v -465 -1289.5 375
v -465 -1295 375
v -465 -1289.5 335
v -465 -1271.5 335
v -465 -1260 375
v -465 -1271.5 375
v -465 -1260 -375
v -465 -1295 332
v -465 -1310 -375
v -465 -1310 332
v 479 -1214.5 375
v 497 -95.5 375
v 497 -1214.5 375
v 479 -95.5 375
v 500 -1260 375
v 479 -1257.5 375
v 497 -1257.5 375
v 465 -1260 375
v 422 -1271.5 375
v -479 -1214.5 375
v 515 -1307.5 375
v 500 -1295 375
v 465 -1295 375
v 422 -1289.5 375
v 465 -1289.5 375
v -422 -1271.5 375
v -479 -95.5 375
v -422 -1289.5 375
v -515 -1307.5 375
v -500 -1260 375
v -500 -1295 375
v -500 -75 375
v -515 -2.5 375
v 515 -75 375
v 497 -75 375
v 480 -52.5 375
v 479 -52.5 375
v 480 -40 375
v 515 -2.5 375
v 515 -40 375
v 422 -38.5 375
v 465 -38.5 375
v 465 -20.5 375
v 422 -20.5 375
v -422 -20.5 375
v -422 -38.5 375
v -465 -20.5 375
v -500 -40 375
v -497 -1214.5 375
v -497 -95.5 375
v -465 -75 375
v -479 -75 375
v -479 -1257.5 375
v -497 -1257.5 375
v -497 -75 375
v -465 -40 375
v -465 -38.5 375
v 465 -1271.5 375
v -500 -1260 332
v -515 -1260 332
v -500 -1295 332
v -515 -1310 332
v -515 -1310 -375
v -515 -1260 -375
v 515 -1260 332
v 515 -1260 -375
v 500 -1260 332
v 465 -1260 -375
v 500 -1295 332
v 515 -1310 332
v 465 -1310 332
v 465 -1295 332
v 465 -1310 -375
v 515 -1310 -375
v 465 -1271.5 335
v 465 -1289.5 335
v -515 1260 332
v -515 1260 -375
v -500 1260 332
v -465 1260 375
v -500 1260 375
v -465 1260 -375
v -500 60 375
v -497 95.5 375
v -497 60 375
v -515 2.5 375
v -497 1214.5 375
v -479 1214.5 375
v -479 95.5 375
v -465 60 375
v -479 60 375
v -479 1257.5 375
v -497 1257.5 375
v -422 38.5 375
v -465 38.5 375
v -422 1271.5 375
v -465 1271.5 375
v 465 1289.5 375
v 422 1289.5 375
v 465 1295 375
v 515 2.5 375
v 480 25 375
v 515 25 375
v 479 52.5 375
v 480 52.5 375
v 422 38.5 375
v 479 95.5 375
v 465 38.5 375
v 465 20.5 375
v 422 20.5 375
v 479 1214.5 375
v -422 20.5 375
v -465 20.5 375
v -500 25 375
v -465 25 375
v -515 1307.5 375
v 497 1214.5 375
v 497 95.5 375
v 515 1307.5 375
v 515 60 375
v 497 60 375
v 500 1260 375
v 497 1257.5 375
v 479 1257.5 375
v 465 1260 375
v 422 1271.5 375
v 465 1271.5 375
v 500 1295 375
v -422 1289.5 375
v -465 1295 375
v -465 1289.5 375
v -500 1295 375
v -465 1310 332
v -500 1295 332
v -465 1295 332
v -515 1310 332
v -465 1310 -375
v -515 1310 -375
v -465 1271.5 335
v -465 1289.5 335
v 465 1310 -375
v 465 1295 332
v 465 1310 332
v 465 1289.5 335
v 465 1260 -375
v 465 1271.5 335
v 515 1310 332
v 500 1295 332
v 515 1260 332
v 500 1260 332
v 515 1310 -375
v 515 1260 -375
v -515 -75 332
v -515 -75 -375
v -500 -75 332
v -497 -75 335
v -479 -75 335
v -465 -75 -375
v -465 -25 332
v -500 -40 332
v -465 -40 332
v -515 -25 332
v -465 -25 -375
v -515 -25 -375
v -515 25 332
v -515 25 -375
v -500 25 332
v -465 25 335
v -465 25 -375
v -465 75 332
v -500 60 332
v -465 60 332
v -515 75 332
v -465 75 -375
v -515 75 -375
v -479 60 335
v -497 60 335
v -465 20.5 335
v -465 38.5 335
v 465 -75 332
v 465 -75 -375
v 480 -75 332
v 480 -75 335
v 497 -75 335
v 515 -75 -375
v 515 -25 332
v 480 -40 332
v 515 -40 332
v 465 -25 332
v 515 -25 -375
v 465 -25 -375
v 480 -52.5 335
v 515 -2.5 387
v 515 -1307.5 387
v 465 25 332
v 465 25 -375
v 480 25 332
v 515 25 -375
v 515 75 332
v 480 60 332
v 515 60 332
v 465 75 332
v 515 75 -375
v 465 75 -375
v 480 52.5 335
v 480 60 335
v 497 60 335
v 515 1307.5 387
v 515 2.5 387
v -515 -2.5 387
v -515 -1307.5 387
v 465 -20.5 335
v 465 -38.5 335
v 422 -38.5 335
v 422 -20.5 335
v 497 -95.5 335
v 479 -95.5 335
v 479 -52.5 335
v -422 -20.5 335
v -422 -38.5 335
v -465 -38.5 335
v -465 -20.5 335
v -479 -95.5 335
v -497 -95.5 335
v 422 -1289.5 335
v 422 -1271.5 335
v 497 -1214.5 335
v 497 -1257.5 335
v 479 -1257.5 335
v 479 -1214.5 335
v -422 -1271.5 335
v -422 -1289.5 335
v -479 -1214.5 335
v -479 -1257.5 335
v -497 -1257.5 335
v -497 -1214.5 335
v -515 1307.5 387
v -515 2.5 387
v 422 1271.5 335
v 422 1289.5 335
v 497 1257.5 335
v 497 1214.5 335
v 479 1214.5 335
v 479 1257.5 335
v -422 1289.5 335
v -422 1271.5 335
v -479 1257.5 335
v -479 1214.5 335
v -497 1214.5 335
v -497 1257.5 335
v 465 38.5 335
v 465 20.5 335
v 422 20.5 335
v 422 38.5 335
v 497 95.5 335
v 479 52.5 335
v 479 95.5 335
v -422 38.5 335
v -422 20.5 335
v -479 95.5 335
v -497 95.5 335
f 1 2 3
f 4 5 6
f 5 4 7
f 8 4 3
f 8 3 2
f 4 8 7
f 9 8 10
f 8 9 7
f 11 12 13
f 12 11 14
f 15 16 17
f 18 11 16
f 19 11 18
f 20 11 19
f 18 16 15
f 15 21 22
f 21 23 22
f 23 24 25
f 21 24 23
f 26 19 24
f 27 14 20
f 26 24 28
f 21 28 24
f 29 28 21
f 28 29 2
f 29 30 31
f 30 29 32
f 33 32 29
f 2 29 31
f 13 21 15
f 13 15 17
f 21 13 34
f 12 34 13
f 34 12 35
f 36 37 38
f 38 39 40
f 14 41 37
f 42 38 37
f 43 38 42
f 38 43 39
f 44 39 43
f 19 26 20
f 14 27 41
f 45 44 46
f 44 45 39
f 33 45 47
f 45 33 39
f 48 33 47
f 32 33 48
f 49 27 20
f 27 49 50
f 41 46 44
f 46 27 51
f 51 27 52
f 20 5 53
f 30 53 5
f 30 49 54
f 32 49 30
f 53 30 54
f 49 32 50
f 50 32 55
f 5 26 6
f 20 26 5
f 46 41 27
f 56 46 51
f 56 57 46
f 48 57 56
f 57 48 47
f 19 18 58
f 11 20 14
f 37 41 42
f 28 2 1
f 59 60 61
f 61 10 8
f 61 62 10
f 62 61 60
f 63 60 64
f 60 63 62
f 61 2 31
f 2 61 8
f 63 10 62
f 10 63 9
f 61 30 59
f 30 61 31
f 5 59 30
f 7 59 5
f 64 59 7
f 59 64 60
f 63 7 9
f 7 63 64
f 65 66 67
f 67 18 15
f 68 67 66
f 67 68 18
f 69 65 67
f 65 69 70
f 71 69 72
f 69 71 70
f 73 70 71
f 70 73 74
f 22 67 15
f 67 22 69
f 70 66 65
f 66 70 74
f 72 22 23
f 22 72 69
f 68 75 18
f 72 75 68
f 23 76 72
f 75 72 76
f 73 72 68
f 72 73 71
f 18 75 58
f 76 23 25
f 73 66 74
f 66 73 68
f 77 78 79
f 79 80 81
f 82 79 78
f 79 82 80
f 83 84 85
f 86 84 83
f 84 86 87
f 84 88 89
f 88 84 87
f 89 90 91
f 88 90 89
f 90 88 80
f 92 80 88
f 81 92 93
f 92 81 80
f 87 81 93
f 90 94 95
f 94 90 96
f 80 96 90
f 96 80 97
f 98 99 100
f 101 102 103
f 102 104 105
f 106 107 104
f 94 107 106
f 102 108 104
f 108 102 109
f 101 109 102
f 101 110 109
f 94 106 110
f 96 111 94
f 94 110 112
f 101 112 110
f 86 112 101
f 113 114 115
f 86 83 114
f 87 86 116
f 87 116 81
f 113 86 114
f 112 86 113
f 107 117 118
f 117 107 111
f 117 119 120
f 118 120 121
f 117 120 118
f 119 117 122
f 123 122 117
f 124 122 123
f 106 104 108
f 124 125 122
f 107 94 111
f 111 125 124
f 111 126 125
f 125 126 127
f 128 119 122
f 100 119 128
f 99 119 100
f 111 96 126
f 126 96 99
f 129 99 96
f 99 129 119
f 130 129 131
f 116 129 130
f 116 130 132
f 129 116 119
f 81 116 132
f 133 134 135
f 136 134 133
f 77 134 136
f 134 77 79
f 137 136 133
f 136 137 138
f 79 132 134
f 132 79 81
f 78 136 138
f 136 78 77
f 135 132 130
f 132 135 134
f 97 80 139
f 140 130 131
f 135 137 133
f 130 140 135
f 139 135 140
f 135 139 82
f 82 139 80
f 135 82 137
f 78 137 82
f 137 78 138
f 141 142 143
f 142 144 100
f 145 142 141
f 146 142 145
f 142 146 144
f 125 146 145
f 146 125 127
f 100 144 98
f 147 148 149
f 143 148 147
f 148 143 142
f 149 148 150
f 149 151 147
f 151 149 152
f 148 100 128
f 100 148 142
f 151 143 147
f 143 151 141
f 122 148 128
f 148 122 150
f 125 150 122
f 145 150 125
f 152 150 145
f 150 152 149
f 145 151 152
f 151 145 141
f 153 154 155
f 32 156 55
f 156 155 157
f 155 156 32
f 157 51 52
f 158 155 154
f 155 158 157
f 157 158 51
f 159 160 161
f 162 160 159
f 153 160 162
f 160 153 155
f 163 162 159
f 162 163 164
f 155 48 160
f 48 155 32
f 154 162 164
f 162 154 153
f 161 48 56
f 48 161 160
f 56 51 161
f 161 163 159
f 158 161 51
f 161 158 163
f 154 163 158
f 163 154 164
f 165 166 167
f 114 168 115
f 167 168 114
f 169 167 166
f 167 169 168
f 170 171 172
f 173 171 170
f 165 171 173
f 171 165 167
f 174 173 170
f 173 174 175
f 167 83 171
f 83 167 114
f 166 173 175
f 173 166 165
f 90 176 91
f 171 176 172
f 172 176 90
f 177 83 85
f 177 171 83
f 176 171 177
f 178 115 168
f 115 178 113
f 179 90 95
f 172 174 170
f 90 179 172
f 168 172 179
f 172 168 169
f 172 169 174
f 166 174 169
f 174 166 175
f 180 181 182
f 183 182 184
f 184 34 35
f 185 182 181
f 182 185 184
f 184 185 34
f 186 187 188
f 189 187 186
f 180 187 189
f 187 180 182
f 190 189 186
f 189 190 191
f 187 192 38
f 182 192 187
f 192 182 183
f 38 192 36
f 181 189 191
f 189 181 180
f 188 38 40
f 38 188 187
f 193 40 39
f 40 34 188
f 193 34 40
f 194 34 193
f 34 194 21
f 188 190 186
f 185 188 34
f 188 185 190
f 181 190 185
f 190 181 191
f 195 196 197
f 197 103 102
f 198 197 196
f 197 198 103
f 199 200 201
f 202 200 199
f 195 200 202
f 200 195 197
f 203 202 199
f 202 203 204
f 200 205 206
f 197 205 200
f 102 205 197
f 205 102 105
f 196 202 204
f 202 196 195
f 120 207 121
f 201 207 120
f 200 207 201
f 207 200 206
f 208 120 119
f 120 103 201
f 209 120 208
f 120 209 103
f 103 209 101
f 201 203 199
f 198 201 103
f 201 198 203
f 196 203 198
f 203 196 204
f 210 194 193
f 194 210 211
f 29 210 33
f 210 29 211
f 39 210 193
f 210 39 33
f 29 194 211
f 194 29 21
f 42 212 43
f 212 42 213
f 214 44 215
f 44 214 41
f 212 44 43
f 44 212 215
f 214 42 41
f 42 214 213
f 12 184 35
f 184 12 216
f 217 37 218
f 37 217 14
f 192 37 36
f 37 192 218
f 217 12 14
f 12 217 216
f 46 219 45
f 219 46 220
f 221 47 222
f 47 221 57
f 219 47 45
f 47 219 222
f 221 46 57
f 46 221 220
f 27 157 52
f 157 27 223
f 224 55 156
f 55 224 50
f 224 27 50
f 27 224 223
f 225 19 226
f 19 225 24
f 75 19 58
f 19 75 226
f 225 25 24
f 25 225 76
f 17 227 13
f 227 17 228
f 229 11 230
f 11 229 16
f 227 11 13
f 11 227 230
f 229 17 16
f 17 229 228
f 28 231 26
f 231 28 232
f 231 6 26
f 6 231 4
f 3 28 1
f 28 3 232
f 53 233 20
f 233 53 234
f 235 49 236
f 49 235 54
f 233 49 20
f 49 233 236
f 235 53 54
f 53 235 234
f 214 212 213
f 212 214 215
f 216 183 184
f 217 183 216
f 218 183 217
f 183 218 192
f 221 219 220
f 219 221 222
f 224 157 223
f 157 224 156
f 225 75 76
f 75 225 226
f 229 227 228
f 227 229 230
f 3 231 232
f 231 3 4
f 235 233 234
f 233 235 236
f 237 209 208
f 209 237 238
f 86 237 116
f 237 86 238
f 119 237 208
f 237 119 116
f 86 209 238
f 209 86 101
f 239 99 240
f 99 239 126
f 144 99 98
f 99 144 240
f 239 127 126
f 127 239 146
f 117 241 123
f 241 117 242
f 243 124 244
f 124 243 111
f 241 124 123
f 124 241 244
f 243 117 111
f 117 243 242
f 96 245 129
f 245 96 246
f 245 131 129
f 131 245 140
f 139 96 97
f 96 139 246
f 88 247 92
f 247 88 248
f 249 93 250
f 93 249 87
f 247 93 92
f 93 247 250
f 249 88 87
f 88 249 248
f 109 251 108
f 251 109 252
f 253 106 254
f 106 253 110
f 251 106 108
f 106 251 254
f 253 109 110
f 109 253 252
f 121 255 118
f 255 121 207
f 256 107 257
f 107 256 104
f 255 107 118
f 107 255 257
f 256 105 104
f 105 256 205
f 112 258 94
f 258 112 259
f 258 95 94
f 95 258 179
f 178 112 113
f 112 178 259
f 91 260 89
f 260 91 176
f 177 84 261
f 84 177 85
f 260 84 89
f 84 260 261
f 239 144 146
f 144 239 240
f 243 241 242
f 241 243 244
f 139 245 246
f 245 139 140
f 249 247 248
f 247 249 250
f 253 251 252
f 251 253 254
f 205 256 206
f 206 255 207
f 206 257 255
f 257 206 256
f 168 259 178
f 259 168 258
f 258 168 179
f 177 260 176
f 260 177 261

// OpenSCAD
// file: top.scad
module top(table_width,table_depth,shelf_thickness,strut_timber_width,strut_timber_depth,leg_timber_width, lap_depth,brace_length)
{
     difference()
     {
	  cube([table_width,table_depth,shelf_thickness],true);
	  //Back Right - x-parallel
	  translate([table_width/2 - brace_length/2 - leg_timber_width,
		     table_depth/2 - strut_timber_depth/2 - strut_timber_depth,
		     -shelf_thickness/2 + shelf_thickness/4/2])
	  {
	       cube([brace_length,strut_timber_depth,shelf_thickness/4],true);
	  }
			
	  //Back right y-parallel
	  translate([table_width/2 - strut_timber_depth/2 - strut_timber_depth,
		     table_depth/2 - brace_length/2 - leg_timber_width,
		     -shelf_thickness/2 + shelf_thickness/4/2])
	  {
	       cube([strut_timber_depth,brace_length,shelf_thickness/4],true);
	  }
			
			
	  //Back Left - x-parallel
	  translate([(table_width/2 - brace_length/2 - leg_timber_width)*-1,
		     table_depth/2 - strut_timber_depth/2 - strut_timber_depth,
		     -shelf_thickness/2 + shelf_thickness/4/2])
	  {
	       cube([brace_length,strut_timber_depth,shelf_thickness/4],true);
	  }
			
	  //Back Left y-parallel
	  translate([(table_width/2 - strut_timber_depth/2 - strut_timber_depth)*-1,
		     table_depth/2 - brace_length/2 - leg_timber_width,
		     -shelf_thickness/2 + shelf_thickness/4/2])
	  {
	       cube([strut_timber_depth,brace_length,shelf_thickness/4],true);
	  }
			
			
	  //Front Right - x-parallel
	  translate([table_width/2 - brace_length/2 - leg_timber_width,
		     (table_depth/2 - strut_timber_depth/2 - strut_timber_depth)*-1,
		     -shelf_thickness/2 + shelf_thickness/4/2])
	  {
	       cube([brace_length,strut_timber_depth,shelf_thickness/4],true);
	  }
			
	  //Back right y-parallel
	  translate([table_width/2 - strut_timber_depth/2 - strut_timber_depth,
		     (table_depth/2 - brace_length/2 - leg_timber_width)*-1,
		     -shelf_thickness/2 + shelf_thickness/4/2])
	  {
	       cube([strut_timber_depth,brace_length,shelf_thickness/4],true);
	  }
			
			
	  //Front Left - x-parallel
	  translate([(table_width/2 - brace_length/2 - leg_timber_width)*-1,
		     (table_depth/2 - strut_timber_depth/2 - strut_timber_depth)*-1,
		     -shelf_thickness/2 + shelf_thickness/4/2])
	  {
	       cube([brace_length,strut_timber_depth,shelf_thickness/4],true);
	  }
			
	  //Front Left y-parallel
	  translate([(table_width/2 - strut_timber_depth/2 - strut_timber_depth)*-1,
		     (table_depth/2 - brace_length/2 - leg_timber_width)*-1,
		     -shelf_thickness/2 + shelf_thickness/4/2])
	  {
	       cube([strut_timber_depth,brace_length,shelf_thickness/4],true);
	  }

     }
		
     //Back Right x-parallel
     translate([table_width/2 - brace_length/2 - leg_timber_width,
		table_depth/2 - strut_timber_depth/2 - strut_timber_depth,
		-strut_timber_width/2-shelf_thickness/4])
     {
	  cube([brace_length,strut_timber_depth,strut_timber_width],true);
     }
		
     // Back right y-parallel
     translate([table_width/2 - strut_timber_depth/2 - strut_timber_depth,
		table_depth/2 - brace_length/2 - leg_timber_width,
		-strut_timber_width/2-shelf_thickness/4])
     {
	  cube([strut_timber_depth,brace_length,strut_timber_width],true);
     }
		
     //Back Left x-parallel
     translate([(table_width/2 - brace_length/2 - leg_timber_width)*-1,
		table_depth/2 - strut_timber_depth/2 - strut_timber_depth,
		-strut_timber_width/2-shelf_thickness/4])
     {
	  cube([brace_length,strut_timber_depth,strut_timber_width],true);
     }
		
     // Back Left y-parallel
     translate([(table_width/2 - strut_timber_depth/2 - strut_timber_depth)*-1,
		table_depth/2 - brace_length/2 - leg_timber_width,
		-strut_timber_width/2-shelf_thickness/4])
     {
	  cube([strut_timber_depth,brace_length,strut_timber_width],true);
     }
		
		
     //Front Right x-parallel
     translate([table_width/2 - brace_length/2 - leg_timber_width,
		(table_depth/2 - strut_timber_depth/2 - strut_timber_depth)*-1,
		-strut_timber_width/2-shelf_thickness/4])
     {
	  cube([brace_length,strut_timber_depth,strut_timber_width],true);
     }
		
     // Front right y-parallel
     translate([table_width/2 - strut_timber_depth/2 - strut_timber_depth,
		(table_depth/2 - brace_length/2 - leg_timber_width)*-1,
		-strut_timber_width/2-shelf_thickness/4])
     {
	  cube([strut_timber_depth,brace_length,strut_timber_width],true);
     }
		
     //Front Left x-parallel
     translate([(table_width/2 - brace_length/2 - leg_timber_width)*-1,
		(table_depth/2 - strut_timber_depth/2 - strut_timber_depth)*-1,
		-strut_timber_width/2-shelf_thickness/4])
     {
	  cube([brace_length,strut_timber_depth,strut_timber_width],true);
     }
		
     //Front Left y-parallel
     translate([(table_width/2 - strut_timber_depth/2 - strut_timber_depth)*-1,
		(table_depth/2 - brace_length/2 - leg_timber_width)*-1,
		-strut_timber_width/2-shelf_thickness/4])
     {
	  cube([strut_timber_depth,brace_length,strut_timber_width],true);
     }
     
}
top(500,300,12,43,17,43,15,43);
// file: leg.scad
module leg(leg_length,lap_depth,leg_timber_width,strut_timber_width,shelf_height )
{
     difference()
     {
	  cube([leg_timber_width,leg_timber_width,leg_length],true);
        
	  // Top tenons
	  translate([0,0,(leg_length-strut_timber_width)/2])
	  {
	       translate([0,-((leg_timber_width-lap_depth)/2),0]){
		    cube([leg_timber_width,lap_depth,strut_timber_width],true);
	       }
	       translate([-((leg_timber_width-lap_depth)/2),0,0]){
		    cube([lap_depth,leg_timber_width,strut_timber_width],true);
	       }
	  }
        
     }
}
// file: config.scad
leg_length=750;
leg_timber_width=50;
strut_timber_width=43;
strut_timber_depth=18;
lap_depth=15;
table_width=1030;
table_depth=2620;
shelf_thickness=12;
shelf_height=(leg_length-strut_timber_width)/2;
table_sit_width=850;
table_sit_depth=190;
// main file
include <config.scad>
use <leg.scad>
use <top.scad>

//Leg
translate([-table_width/2+leg_timber_width/2,-table_depth/2+leg_timber_width/2,0])
{
    leg(leg_length,lap_depth,leg_timber_width,strut_timber_width,shelf_height);
}

//Leg
translate([table_width/2-leg_timber_width/2,-table_depth/2+leg_timber_width/2,0]){
    rotate([0,0,90]){
        leg(leg_length,lap_depth,leg_timber_width,strut_timber_width,shelf_height);
    }
}

//Leg
translate([-table_width/2+leg_timber_width/2,table_depth/2-leg_timber_width/2,0]){
    rotate([0,0,-90]){
        leg(leg_length,lap_depth,leg_timber_width,strut_timber_width,shelf_height);
    }
}

//Leg
translate([table_width/2-leg_timber_width/2,table_depth/2-leg_timber_width/2,0]){
    rotate([0,0,180]){
        leg(leg_length,lap_depth,leg_timber_width,strut_timber_width,shelf_height);
    }
}

//Leg
translate([-table_width/2+leg_timber_width/2,-leg_timber_width,0]){
    rotate([0,0,-90]){
        leg(leg_length,lap_depth,leg_timber_width,strut_timber_width,shelf_height);
    }
}

//Leg
translate([-table_width/2+leg_timber_width/2,leg_timber_width,0]){
    rotate([0,0,-90]){
        leg(leg_length,lap_depth,leg_timber_width,strut_timber_width,shelf_height);
    }
}

//Leg
translate([table_width/2-leg_timber_width/2,-leg_timber_width,0]){
    rotate([0,0,-90]){
        leg(leg_length,lap_depth,leg_timber_width,strut_timber_width,shelf_height);
    }
}

//Leg
translate([table_width/2-leg_timber_width/2,leg_timber_width,0]){
    rotate([0,0,-90]){
        leg(leg_length,lap_depth,leg_timber_width,strut_timber_width,shelf_height);
    }
}

//Top
translate([0,-table_depth/4,leg_length/2+shelf_thickness/2]){
    top(table_width,table_depth/2-5,shelf_thickness,strut_timber_width,strut_timber_depth,leg_timber_width, lap_depth,43);
}

//Top
translate([0,table_depth/4,leg_length/2+shelf_thickness/2]){
    top(table_width,table_depth/2-5,shelf_thickness,strut_timber_width,strut_timber_depth,leg_timber_width, lap_depth,43);
}
